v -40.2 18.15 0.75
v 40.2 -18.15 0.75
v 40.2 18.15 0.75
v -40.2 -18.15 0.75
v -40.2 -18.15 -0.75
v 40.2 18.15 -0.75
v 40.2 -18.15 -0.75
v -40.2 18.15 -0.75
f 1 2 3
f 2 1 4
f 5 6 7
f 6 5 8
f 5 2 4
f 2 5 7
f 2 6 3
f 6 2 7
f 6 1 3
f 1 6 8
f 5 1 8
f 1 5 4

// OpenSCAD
$fn=64;

module mainboard(size_x=80.4, size_y=36.3, thickness=1.5) {
    translate([-size_x/2, -size_y/2, -thickness/2])
        cube([size_x, size_y, thickness], center=false);
}

mainboard();
